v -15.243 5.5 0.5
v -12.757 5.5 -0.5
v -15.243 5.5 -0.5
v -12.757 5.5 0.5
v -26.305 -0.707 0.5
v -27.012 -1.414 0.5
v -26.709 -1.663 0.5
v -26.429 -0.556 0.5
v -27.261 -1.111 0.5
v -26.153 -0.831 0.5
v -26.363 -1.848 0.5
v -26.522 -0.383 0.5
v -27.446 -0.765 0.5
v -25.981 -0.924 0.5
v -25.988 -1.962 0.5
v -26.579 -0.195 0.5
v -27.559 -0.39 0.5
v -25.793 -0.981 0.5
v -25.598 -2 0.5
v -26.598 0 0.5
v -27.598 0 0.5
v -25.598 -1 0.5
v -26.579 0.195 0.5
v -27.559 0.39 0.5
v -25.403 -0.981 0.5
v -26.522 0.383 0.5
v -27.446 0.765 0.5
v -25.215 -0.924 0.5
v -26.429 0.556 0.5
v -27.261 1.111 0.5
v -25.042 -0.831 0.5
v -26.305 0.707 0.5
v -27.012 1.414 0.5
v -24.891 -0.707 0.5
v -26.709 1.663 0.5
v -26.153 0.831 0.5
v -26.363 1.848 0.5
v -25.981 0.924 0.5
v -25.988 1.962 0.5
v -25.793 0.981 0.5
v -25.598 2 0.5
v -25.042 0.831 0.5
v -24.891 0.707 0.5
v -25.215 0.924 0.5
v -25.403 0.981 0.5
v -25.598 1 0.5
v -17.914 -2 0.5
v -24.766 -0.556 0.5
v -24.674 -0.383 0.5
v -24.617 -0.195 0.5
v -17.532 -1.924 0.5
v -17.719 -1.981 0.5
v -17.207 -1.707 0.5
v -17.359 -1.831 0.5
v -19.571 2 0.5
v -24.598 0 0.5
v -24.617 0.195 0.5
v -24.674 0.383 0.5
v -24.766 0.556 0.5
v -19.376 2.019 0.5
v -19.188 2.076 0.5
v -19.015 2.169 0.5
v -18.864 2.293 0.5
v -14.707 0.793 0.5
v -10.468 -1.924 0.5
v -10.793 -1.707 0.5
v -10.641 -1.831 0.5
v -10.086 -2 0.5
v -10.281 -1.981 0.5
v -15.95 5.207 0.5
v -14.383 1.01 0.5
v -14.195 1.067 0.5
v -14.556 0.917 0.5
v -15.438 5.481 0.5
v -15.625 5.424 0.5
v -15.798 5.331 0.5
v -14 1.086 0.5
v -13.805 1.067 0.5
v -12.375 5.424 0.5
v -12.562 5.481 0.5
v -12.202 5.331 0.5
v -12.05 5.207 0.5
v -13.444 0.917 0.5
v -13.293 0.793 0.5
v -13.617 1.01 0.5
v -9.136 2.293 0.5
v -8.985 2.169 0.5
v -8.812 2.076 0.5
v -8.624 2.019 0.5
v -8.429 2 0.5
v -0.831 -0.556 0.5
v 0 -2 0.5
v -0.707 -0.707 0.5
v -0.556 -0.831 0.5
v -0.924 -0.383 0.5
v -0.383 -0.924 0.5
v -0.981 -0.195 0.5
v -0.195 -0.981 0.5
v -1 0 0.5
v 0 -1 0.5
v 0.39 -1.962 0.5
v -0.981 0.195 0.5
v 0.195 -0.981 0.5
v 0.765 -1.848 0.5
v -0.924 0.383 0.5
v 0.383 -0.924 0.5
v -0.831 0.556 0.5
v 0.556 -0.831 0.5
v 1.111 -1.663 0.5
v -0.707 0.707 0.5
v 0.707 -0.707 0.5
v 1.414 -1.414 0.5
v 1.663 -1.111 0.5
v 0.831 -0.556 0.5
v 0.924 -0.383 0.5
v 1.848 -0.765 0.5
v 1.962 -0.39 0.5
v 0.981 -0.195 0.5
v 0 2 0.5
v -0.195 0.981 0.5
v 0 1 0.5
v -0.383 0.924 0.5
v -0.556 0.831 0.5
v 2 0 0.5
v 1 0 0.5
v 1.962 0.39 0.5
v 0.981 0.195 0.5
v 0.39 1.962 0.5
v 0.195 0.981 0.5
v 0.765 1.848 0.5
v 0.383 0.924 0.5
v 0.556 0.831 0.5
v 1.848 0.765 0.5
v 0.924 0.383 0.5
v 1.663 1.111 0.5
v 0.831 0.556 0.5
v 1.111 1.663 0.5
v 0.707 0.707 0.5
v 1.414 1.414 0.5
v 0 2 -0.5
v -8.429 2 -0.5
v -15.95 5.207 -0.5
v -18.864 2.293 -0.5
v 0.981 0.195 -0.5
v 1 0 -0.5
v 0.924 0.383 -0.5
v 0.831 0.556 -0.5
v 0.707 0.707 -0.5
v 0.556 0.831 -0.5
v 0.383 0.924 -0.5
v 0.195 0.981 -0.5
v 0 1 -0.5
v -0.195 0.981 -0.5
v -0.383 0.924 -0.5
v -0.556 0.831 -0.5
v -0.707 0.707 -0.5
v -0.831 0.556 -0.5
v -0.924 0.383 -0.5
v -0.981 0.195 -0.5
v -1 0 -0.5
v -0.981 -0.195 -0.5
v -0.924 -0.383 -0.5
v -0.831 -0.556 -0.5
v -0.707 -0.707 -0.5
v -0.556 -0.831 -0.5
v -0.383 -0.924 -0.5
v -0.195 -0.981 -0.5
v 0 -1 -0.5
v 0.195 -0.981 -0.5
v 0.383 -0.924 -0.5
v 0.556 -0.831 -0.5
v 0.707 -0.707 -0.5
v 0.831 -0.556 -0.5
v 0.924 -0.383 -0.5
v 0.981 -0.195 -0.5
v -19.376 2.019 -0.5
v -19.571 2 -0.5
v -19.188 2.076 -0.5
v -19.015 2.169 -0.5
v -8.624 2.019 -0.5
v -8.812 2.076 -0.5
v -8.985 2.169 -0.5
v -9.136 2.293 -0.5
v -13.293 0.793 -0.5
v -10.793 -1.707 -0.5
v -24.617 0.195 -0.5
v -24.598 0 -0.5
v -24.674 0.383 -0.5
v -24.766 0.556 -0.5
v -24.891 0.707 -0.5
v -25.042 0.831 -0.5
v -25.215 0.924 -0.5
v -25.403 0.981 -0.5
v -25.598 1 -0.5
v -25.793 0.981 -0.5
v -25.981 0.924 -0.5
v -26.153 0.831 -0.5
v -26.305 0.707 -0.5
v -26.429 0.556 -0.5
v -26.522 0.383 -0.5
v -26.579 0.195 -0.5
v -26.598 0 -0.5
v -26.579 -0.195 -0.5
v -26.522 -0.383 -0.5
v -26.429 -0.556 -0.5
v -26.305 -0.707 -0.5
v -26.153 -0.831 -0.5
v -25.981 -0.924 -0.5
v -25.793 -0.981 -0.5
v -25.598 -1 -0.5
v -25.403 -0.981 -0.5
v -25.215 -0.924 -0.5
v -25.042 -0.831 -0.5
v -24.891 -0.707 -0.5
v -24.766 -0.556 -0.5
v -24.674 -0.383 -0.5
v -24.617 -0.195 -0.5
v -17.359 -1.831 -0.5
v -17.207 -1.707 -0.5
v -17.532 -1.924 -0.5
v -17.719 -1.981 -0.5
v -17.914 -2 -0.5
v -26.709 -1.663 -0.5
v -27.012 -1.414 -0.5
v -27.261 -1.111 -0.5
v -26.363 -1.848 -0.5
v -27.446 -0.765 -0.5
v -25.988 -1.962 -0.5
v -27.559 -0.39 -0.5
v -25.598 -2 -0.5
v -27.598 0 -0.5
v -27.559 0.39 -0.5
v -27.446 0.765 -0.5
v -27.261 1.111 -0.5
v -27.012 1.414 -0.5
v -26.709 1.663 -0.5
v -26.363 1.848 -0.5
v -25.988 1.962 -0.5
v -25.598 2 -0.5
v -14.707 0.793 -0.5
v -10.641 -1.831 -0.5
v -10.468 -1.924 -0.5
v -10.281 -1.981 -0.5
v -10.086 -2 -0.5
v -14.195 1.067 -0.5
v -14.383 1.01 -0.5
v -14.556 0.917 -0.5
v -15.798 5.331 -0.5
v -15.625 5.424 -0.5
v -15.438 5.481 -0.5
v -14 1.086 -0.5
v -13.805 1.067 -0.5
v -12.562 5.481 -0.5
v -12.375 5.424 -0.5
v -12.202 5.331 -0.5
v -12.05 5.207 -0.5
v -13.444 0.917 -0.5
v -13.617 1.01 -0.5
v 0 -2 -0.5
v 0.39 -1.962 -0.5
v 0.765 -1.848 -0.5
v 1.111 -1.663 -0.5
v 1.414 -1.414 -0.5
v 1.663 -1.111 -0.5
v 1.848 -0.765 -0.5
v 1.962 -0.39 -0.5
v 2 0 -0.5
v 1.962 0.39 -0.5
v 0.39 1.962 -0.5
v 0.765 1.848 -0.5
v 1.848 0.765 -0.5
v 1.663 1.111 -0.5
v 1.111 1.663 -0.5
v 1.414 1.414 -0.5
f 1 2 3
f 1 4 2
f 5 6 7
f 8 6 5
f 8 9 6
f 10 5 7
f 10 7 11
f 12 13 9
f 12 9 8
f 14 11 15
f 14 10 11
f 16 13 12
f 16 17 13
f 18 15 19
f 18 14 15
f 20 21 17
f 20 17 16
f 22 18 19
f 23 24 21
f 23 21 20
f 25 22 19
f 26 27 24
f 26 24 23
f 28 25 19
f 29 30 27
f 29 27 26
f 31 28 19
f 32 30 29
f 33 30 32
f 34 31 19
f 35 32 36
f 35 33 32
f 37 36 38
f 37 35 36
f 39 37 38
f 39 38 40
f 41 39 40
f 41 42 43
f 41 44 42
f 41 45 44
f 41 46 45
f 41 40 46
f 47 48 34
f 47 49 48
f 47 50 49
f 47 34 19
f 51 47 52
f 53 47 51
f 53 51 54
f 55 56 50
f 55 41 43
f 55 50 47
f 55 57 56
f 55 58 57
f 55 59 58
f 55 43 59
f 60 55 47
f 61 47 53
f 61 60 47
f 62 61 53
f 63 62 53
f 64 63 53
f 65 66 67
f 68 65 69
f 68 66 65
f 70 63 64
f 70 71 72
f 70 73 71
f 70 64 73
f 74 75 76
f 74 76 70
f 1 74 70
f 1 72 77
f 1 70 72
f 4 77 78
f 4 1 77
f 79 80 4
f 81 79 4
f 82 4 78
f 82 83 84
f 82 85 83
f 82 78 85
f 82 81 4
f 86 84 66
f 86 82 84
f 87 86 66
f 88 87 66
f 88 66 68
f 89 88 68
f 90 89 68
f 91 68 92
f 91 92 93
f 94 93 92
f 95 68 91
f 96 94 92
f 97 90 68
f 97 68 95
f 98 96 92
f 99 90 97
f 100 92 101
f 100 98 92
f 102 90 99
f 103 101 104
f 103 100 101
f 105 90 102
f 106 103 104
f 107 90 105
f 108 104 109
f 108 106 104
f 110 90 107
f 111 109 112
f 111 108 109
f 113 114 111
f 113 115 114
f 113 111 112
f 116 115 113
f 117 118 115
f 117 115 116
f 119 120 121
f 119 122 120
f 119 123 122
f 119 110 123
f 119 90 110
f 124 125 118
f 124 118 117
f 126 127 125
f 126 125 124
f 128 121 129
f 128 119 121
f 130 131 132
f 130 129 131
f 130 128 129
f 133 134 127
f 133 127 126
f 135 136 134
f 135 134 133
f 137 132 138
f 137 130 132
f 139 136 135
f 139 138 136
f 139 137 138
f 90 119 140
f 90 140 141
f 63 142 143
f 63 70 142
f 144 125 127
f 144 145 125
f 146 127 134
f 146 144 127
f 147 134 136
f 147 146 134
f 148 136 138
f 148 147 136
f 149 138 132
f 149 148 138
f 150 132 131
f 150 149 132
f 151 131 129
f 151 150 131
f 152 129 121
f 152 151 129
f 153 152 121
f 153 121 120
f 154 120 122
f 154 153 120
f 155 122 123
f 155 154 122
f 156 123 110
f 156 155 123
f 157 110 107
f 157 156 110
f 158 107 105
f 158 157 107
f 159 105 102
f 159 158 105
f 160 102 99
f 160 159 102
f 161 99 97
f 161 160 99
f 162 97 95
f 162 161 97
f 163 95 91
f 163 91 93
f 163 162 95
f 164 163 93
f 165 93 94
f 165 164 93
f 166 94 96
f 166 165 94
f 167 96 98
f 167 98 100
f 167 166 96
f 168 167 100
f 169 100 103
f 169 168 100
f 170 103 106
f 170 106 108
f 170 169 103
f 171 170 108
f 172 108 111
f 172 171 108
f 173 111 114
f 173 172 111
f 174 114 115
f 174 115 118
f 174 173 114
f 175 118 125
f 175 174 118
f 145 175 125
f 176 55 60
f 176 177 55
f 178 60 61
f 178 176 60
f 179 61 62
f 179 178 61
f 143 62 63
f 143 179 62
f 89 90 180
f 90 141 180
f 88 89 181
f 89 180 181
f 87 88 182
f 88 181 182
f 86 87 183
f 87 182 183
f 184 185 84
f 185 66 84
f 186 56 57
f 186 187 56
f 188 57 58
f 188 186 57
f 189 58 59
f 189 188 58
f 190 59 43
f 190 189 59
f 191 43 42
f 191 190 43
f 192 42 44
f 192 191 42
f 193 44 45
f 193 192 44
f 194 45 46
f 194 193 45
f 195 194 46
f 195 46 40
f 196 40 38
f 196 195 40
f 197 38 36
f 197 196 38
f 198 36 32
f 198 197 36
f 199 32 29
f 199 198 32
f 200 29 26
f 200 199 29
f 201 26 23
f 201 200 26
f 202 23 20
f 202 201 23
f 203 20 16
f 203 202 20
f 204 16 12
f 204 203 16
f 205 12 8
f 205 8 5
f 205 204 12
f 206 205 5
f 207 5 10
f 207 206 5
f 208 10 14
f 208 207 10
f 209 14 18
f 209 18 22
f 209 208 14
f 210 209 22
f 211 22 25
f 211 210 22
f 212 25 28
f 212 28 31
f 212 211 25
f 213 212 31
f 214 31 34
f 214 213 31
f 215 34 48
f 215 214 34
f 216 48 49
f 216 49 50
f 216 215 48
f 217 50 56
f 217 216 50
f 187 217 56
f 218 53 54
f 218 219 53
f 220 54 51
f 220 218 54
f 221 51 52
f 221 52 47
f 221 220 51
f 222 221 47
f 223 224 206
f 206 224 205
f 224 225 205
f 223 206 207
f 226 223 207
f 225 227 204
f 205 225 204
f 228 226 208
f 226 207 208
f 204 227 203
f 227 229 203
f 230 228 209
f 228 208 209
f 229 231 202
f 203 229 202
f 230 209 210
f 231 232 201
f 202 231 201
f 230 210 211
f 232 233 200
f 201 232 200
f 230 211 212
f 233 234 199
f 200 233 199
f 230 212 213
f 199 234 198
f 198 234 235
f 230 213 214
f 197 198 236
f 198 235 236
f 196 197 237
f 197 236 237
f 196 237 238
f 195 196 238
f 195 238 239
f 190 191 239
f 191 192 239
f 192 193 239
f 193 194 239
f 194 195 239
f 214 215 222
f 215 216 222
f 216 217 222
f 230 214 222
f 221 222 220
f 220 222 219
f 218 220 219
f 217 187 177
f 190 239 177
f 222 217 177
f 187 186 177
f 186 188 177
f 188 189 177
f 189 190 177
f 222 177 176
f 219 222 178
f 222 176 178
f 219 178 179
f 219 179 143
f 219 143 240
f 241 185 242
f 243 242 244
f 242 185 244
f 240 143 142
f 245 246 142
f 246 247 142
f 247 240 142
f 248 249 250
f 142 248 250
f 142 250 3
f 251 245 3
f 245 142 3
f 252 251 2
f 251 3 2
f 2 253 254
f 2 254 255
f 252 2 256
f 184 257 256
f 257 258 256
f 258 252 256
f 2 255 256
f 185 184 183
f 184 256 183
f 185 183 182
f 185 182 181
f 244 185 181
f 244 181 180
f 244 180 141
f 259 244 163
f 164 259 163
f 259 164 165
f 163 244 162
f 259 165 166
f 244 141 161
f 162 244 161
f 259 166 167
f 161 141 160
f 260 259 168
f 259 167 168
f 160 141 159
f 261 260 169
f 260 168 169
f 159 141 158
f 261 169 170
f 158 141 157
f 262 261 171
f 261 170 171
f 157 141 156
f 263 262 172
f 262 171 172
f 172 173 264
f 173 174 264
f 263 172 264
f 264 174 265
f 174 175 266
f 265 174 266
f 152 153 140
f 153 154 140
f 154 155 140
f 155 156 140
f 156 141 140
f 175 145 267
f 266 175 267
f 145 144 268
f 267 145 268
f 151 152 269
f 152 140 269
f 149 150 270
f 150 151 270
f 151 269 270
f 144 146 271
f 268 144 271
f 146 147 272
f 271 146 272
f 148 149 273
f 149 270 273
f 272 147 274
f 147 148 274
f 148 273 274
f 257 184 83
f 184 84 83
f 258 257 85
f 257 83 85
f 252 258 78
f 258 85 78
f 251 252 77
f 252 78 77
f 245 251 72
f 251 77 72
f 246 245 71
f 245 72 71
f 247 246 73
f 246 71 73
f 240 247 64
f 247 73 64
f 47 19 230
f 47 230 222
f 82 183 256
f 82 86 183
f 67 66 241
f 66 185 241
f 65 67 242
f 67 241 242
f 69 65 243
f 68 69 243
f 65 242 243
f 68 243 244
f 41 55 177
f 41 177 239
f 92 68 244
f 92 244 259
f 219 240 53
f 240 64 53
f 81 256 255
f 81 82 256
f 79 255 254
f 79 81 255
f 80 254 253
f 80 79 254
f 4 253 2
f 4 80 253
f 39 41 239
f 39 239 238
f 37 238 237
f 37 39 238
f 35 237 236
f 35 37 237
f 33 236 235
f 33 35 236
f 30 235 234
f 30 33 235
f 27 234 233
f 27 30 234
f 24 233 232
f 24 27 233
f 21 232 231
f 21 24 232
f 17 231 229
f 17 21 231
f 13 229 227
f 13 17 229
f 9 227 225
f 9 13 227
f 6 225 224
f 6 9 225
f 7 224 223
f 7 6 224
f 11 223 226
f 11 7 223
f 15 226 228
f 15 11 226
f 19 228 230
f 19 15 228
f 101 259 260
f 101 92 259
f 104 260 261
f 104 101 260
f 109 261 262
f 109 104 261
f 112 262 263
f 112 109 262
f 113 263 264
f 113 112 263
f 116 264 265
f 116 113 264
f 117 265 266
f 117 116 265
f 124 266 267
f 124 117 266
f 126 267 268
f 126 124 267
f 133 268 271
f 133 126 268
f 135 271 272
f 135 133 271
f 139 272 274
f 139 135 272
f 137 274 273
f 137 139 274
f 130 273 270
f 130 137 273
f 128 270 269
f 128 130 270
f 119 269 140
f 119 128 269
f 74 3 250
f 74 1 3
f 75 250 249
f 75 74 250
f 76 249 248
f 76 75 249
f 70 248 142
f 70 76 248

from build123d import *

# Parameters (mm, degrees)
SKETCH_1_R      = 1
EXTRUDE_1_DEPTH = 0.5
EXTRUDE1_DEPTH  = 0.5
EXTRUDE2_DEPTH  = 0.5
FILLET8_R       = 1
FILLET9_R       = 1


with BuildPart() as part:
    # Эскиз1 → Бобышка-Вытянуть1 (new, symmetric)
    with BuildSketch(Plane.XY):
        with BuildLine():
            Line((0, 2), (-25.5979, 2))
            ThreePointArc((-25.5979, 2), (-27.5979, 0), (-25.5979, -2))
            Line((-25.5979, -2), (0, -2))
            ThreePointArc((0, -2), (2, 0), (0, 2))
        make_face()
        with Locations((-25.5979, 0)):
            Circle(SKETCH_1_R, mode=Mode.SUBTRACT)
        Circle(SKETCH_1_R, mode=Mode.SUBTRACT)
    extrude(amount=EXTRUDE_1_DEPTH, both=True)

    # Sketch1 → Extrude1 (add, symmetric)
    with BuildSketch(Plane.XY):
        Polygon((-8.843145751, 2), (-12.343145751, 5.5), (-15.656854249, 5.5), (-19.156854249, 2), align=None)
    extrude(amount=EXTRUDE1_DEPTH, both=True)

    # Sketch → Extrude2 (cut, symmetric)
    with BuildSketch(Plane.XY):
        Polygon((-10.5, -2), (-14, 1.5), (-17.5, -2), align=None)
    extrude(amount=EXTRUDE2_DEPTH, both=True, mode=Mode.SUBTRACT)

    # Fillet8
    fillet8_edges = [part.edges().sort_by_distance(p)[0] for p in [
        (-8.843145751, 2, 0),
        (-19.156854249, 2, 0),
        (-14, 1.5, 0),
    ]]
    fillet(fillet8_edges, radius=FILLET8_R)

    # Fillet9
    fillet9_edges = [part.edges().sort_by_distance(p)[0] for p in [
        (-15.656854249, 5.5, 0),
        (-12.343145751, 5.5, 0),
        (-17.5, -2, 0),
        (-10.5, -2, 0),
    ]]
    fillet(fillet9_edges, radius=FILLET9_R)


solid = part.part
